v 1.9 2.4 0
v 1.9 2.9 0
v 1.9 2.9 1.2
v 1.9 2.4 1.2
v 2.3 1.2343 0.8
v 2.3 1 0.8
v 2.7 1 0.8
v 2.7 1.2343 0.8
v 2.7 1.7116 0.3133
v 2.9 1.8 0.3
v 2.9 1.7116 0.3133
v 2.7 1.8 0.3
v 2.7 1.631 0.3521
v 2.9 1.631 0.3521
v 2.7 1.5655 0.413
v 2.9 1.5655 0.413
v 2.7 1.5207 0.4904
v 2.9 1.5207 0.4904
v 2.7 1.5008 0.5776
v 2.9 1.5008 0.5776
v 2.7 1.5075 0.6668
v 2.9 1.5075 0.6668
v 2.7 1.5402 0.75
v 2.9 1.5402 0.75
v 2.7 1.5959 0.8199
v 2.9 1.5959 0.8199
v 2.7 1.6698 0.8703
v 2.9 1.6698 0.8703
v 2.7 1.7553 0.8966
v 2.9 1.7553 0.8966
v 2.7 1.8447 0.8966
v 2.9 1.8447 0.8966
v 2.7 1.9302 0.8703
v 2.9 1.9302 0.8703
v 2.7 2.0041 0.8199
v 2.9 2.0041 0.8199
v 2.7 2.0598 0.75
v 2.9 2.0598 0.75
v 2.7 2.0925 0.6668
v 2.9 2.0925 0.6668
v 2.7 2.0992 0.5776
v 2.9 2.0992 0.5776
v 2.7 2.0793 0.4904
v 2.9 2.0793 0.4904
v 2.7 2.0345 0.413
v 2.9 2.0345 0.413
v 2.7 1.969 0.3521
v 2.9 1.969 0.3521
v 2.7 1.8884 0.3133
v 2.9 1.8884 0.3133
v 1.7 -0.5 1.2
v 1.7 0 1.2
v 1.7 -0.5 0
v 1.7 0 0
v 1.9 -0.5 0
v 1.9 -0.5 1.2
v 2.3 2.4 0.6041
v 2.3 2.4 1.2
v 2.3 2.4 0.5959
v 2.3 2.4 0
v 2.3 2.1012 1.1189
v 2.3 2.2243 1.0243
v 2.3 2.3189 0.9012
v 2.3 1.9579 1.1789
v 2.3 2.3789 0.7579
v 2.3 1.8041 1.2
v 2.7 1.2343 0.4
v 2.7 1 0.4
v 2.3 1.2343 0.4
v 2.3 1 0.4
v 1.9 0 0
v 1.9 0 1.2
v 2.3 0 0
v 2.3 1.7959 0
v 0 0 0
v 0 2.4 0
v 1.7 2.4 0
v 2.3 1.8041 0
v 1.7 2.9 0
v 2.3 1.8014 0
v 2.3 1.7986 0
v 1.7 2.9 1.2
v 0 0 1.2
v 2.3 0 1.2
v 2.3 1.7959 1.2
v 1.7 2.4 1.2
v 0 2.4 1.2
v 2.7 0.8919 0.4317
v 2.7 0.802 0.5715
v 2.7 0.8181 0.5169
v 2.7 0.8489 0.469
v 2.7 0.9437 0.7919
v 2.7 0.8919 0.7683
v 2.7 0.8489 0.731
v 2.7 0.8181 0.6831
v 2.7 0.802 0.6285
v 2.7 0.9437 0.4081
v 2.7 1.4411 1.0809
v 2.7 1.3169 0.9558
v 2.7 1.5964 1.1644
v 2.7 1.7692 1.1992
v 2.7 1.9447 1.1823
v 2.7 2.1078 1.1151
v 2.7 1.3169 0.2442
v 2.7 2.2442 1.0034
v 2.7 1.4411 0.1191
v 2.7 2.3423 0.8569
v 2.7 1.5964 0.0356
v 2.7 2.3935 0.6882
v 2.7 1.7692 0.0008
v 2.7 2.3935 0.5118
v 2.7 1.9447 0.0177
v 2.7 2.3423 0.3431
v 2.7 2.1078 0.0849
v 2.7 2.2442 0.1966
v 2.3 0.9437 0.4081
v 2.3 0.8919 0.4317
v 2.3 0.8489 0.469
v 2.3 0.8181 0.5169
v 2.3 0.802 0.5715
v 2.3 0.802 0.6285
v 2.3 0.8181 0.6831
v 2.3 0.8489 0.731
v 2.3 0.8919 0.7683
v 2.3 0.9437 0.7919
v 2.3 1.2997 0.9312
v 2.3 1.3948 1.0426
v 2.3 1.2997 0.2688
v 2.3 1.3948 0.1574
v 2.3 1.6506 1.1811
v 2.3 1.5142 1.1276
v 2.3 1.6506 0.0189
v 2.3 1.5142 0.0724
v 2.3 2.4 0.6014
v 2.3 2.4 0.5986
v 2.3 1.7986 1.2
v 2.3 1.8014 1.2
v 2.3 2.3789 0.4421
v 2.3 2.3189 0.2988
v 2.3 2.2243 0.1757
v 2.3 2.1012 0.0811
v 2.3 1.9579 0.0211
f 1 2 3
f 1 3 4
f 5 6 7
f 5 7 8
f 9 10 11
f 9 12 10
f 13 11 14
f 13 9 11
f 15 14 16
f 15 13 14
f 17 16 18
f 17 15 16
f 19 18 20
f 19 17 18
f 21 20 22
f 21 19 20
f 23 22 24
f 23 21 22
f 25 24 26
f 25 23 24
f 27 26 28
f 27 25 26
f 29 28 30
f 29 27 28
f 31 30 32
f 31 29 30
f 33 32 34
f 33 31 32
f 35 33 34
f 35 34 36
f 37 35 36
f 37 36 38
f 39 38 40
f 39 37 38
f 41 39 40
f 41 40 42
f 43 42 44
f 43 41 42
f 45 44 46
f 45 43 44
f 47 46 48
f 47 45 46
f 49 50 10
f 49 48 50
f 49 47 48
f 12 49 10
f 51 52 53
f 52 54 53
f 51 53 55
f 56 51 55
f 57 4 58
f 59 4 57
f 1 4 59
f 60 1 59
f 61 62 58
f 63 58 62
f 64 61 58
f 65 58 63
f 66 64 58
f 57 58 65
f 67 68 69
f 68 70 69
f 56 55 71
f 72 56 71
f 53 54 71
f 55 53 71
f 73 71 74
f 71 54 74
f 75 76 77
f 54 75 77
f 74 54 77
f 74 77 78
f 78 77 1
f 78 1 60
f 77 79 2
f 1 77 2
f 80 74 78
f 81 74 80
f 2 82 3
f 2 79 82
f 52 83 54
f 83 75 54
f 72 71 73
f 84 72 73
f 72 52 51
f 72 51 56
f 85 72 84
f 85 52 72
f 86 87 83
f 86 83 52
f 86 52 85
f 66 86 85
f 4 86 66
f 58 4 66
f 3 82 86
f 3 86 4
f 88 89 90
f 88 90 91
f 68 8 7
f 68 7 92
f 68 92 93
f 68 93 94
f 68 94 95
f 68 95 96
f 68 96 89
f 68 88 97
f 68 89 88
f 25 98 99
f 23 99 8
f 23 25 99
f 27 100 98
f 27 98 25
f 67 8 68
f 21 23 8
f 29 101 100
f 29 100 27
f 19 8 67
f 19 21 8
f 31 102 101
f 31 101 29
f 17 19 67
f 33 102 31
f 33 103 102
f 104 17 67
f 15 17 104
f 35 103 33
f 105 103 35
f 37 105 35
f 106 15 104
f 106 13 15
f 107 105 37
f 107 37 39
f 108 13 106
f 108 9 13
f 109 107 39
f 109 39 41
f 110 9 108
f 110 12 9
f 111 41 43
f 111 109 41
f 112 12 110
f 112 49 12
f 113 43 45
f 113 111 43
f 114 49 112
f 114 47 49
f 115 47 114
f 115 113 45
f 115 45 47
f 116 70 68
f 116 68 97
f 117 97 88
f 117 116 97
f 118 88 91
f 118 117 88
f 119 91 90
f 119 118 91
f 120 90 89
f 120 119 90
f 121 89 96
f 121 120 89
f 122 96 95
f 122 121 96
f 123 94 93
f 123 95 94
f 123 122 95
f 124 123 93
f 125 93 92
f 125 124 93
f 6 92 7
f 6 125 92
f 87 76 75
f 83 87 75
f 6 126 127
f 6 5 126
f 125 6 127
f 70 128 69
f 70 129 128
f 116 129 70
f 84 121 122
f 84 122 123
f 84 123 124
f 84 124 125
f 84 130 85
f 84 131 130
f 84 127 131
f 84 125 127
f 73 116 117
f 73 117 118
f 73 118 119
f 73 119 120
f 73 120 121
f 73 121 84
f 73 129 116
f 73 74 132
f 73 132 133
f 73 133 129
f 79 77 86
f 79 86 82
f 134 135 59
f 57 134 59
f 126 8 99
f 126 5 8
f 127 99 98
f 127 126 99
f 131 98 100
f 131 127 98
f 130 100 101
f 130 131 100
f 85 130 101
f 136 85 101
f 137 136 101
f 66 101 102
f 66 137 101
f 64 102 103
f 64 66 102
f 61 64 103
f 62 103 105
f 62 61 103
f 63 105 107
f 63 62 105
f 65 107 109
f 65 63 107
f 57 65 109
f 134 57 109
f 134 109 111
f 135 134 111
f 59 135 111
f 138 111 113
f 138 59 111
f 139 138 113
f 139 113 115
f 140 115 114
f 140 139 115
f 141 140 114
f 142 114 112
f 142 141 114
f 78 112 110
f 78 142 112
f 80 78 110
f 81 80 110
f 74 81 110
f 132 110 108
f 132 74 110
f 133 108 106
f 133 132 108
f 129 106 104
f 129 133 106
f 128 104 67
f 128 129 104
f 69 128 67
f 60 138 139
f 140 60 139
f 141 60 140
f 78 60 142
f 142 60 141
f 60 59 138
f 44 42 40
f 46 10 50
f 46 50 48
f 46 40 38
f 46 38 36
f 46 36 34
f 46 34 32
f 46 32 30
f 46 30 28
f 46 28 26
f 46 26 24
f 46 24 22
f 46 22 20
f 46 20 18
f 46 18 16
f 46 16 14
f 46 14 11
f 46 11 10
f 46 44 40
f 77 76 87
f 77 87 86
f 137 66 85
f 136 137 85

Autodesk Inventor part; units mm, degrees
ref_plane "YZ Plane" through (0, 0, 0) normal (1, 0, 0) x (0, 1, 0)
ref_plane "XZ Plane" through (0, 0, 0) normal (0, 1, 0) x (-1, 0, 0)
ref_plane "XY Plane" through (0, 0, 0) normal (0, 0, 1) x (1, 0, 0)
sketch "Boceto1" plane through (0, 0, 0) normal (0, 0, 1) x (1, 0, 0)
  line L0 (0, 2.4) -> (0, 0)
  line L1 (0, 0) -> (1.7, 0)
  line L2 (0, 2.4) -> (1.7, 2.4)
  line L3 (1.7, 2.4) -> (1.7, 2.9)
  line L4 (1.7, 2.9) -> (1.9, 2.9)
  line L5 (1.9, 2.9) -> (1.9, 2.4)
  line L6 (1.9, 2.4) -> (2.3, 2.4)
  line L7 (2.3, 2.4) -> (2.3, 0)
  line L8 (2.3, 2.4) -> (2.7, 2.4)
  line L9 (2.7, 1.2) -> (2.7, 0.8)
  line L10 (2.7, 0.8) -> (2.3, 0.8)
  line L11 (1.7, 0) -> (1.7, -0.5)
  line L12 (1.7, -0.5) -> (1.9, -0.5)
  line L13 (1.9, -0.5) -> (1.9, 0)
  line L14 (1.9, 0) -> (2.3, 0)
  line L15 (2.3, 1.2) -> (2.7, 1.2)
  line L16 (2.7, 1.2) -> (2.7, 2.4)
  line L17 (2.7, 1.5) -> (2.9, 1.5)
  line L18 (2.9, 1.5) -> (2.9, 2.1)
  line L19 (2.9, 2.1) -> (2.7, 2.1)
extrude "Extrusión1" add sketch "Boceto1" along normal blind 1.2 contours L2 L3 L4 L5 L6 L7 L14 L13 L12 L11 L1 L0
sketch "Boceto2" plane through (2.3, 0, 0) normal (1, 0, 0) x (0, 0, -1)
  line L0 (0, 0) -> (0, 2.4) projected
  line L1 (0, 2.4) -> (-1.2, 2.4) projected
  line L2 (-1.2, 0) -> (-1.2, 2.4) projected
  line L3 (0, 0) -> (-1.2, 0) projected
  line L4 (-1.2, 2.4) -> (-1.2, 0)
  line L5 (-1.2, 0) -> (0, 0)
  line L6 (0, 2.4) -> (-1.2, 2.4)
  line L7 (-1.2, 2.9) -> (0, 2.9)
  line L8 (-1.2, 2.9) -> (-1.2, 2.4)
  line L9 (-1.2, -0.5) -> (0, -0.5)
  line L10 (0, -0.5) -> (0, 2.9)
  line L11 (-1.2, 0) -> (-1.2, -0.5)
  arc A0 (-0.4, 1.2343) -> (-0.8, 1.2343) centre (-0.6, 1.8) ccw
  circle A1 centre (-0.6, 1.8) radius 0.3
  arc A2 (-0.8, 1) -> (-0.4, 1) centre (-0.6, 1) ccw
  line L12 (-0.8, 1) -> (-0.8, 1.2343)
  line L13 (-0.4, 1) -> (-0.4, 1.2343)
extrude "Extrusión2" add sketch "Boceto2" along normal blind 0.4 contours A0 L13 A2 L12 | A1
sketch "Boceto3" plane through (2.7, 0, 0) normal (1, 0, 0) x (0, 0, -1)
  line L0 (-1.2, 2.4) -> (-1.2, 0)
  line L1 (-1.2, 0) -> (0, 0)
  line L2 (0, 2.4) -> (-1.2, 2.4)
  line L3 (-1.2, 2.9) -> (0, 2.9)
  line L4 (-1.2, 2.9) -> (-1.2, 2.4)
  line L5 (-1.2, -0.5) -> (0, -0.5)
  line L6 (0, -0.5) -> (0, 2.9)
  line L7 (-1.2, 0) -> (-1.2, -0.5)
  arc A0 (-0.4, 1.2343) -> (-0.8, 1.2343) centre (-0.6, 1.8) ccw
  circle A1 centre (-0.6, 1.8) radius 0.3
  arc A2 (-0.8, 1) -> (-0.4, 1) centre (-0.6, 1) ccw
  line L8 (-0.8, 1) -> (-0.8, 1.2343)
  line L9 (-0.4, 1) -> (-0.4, 1.2343)
  arc A3 (-0.4, 1.2343) -> (-0.8, 1.2343) centre (-0.6, 1.8) ccw projected
  line L10 (-0.8, 1.2343) -> (-0.8, 1) projected
  arc A4 (-0.8, 1) -> (-0.4, 1) centre (-0.6, 1) ccw projected
  line L11 (-0.4, 1) -> (-0.4, 1.2343) projected
  point P0 (0, 0)
extrude "Extrusión3" add sketch "Boceto3" along normal blind 0.2 contours A1
properties part number "learnbotServo"
